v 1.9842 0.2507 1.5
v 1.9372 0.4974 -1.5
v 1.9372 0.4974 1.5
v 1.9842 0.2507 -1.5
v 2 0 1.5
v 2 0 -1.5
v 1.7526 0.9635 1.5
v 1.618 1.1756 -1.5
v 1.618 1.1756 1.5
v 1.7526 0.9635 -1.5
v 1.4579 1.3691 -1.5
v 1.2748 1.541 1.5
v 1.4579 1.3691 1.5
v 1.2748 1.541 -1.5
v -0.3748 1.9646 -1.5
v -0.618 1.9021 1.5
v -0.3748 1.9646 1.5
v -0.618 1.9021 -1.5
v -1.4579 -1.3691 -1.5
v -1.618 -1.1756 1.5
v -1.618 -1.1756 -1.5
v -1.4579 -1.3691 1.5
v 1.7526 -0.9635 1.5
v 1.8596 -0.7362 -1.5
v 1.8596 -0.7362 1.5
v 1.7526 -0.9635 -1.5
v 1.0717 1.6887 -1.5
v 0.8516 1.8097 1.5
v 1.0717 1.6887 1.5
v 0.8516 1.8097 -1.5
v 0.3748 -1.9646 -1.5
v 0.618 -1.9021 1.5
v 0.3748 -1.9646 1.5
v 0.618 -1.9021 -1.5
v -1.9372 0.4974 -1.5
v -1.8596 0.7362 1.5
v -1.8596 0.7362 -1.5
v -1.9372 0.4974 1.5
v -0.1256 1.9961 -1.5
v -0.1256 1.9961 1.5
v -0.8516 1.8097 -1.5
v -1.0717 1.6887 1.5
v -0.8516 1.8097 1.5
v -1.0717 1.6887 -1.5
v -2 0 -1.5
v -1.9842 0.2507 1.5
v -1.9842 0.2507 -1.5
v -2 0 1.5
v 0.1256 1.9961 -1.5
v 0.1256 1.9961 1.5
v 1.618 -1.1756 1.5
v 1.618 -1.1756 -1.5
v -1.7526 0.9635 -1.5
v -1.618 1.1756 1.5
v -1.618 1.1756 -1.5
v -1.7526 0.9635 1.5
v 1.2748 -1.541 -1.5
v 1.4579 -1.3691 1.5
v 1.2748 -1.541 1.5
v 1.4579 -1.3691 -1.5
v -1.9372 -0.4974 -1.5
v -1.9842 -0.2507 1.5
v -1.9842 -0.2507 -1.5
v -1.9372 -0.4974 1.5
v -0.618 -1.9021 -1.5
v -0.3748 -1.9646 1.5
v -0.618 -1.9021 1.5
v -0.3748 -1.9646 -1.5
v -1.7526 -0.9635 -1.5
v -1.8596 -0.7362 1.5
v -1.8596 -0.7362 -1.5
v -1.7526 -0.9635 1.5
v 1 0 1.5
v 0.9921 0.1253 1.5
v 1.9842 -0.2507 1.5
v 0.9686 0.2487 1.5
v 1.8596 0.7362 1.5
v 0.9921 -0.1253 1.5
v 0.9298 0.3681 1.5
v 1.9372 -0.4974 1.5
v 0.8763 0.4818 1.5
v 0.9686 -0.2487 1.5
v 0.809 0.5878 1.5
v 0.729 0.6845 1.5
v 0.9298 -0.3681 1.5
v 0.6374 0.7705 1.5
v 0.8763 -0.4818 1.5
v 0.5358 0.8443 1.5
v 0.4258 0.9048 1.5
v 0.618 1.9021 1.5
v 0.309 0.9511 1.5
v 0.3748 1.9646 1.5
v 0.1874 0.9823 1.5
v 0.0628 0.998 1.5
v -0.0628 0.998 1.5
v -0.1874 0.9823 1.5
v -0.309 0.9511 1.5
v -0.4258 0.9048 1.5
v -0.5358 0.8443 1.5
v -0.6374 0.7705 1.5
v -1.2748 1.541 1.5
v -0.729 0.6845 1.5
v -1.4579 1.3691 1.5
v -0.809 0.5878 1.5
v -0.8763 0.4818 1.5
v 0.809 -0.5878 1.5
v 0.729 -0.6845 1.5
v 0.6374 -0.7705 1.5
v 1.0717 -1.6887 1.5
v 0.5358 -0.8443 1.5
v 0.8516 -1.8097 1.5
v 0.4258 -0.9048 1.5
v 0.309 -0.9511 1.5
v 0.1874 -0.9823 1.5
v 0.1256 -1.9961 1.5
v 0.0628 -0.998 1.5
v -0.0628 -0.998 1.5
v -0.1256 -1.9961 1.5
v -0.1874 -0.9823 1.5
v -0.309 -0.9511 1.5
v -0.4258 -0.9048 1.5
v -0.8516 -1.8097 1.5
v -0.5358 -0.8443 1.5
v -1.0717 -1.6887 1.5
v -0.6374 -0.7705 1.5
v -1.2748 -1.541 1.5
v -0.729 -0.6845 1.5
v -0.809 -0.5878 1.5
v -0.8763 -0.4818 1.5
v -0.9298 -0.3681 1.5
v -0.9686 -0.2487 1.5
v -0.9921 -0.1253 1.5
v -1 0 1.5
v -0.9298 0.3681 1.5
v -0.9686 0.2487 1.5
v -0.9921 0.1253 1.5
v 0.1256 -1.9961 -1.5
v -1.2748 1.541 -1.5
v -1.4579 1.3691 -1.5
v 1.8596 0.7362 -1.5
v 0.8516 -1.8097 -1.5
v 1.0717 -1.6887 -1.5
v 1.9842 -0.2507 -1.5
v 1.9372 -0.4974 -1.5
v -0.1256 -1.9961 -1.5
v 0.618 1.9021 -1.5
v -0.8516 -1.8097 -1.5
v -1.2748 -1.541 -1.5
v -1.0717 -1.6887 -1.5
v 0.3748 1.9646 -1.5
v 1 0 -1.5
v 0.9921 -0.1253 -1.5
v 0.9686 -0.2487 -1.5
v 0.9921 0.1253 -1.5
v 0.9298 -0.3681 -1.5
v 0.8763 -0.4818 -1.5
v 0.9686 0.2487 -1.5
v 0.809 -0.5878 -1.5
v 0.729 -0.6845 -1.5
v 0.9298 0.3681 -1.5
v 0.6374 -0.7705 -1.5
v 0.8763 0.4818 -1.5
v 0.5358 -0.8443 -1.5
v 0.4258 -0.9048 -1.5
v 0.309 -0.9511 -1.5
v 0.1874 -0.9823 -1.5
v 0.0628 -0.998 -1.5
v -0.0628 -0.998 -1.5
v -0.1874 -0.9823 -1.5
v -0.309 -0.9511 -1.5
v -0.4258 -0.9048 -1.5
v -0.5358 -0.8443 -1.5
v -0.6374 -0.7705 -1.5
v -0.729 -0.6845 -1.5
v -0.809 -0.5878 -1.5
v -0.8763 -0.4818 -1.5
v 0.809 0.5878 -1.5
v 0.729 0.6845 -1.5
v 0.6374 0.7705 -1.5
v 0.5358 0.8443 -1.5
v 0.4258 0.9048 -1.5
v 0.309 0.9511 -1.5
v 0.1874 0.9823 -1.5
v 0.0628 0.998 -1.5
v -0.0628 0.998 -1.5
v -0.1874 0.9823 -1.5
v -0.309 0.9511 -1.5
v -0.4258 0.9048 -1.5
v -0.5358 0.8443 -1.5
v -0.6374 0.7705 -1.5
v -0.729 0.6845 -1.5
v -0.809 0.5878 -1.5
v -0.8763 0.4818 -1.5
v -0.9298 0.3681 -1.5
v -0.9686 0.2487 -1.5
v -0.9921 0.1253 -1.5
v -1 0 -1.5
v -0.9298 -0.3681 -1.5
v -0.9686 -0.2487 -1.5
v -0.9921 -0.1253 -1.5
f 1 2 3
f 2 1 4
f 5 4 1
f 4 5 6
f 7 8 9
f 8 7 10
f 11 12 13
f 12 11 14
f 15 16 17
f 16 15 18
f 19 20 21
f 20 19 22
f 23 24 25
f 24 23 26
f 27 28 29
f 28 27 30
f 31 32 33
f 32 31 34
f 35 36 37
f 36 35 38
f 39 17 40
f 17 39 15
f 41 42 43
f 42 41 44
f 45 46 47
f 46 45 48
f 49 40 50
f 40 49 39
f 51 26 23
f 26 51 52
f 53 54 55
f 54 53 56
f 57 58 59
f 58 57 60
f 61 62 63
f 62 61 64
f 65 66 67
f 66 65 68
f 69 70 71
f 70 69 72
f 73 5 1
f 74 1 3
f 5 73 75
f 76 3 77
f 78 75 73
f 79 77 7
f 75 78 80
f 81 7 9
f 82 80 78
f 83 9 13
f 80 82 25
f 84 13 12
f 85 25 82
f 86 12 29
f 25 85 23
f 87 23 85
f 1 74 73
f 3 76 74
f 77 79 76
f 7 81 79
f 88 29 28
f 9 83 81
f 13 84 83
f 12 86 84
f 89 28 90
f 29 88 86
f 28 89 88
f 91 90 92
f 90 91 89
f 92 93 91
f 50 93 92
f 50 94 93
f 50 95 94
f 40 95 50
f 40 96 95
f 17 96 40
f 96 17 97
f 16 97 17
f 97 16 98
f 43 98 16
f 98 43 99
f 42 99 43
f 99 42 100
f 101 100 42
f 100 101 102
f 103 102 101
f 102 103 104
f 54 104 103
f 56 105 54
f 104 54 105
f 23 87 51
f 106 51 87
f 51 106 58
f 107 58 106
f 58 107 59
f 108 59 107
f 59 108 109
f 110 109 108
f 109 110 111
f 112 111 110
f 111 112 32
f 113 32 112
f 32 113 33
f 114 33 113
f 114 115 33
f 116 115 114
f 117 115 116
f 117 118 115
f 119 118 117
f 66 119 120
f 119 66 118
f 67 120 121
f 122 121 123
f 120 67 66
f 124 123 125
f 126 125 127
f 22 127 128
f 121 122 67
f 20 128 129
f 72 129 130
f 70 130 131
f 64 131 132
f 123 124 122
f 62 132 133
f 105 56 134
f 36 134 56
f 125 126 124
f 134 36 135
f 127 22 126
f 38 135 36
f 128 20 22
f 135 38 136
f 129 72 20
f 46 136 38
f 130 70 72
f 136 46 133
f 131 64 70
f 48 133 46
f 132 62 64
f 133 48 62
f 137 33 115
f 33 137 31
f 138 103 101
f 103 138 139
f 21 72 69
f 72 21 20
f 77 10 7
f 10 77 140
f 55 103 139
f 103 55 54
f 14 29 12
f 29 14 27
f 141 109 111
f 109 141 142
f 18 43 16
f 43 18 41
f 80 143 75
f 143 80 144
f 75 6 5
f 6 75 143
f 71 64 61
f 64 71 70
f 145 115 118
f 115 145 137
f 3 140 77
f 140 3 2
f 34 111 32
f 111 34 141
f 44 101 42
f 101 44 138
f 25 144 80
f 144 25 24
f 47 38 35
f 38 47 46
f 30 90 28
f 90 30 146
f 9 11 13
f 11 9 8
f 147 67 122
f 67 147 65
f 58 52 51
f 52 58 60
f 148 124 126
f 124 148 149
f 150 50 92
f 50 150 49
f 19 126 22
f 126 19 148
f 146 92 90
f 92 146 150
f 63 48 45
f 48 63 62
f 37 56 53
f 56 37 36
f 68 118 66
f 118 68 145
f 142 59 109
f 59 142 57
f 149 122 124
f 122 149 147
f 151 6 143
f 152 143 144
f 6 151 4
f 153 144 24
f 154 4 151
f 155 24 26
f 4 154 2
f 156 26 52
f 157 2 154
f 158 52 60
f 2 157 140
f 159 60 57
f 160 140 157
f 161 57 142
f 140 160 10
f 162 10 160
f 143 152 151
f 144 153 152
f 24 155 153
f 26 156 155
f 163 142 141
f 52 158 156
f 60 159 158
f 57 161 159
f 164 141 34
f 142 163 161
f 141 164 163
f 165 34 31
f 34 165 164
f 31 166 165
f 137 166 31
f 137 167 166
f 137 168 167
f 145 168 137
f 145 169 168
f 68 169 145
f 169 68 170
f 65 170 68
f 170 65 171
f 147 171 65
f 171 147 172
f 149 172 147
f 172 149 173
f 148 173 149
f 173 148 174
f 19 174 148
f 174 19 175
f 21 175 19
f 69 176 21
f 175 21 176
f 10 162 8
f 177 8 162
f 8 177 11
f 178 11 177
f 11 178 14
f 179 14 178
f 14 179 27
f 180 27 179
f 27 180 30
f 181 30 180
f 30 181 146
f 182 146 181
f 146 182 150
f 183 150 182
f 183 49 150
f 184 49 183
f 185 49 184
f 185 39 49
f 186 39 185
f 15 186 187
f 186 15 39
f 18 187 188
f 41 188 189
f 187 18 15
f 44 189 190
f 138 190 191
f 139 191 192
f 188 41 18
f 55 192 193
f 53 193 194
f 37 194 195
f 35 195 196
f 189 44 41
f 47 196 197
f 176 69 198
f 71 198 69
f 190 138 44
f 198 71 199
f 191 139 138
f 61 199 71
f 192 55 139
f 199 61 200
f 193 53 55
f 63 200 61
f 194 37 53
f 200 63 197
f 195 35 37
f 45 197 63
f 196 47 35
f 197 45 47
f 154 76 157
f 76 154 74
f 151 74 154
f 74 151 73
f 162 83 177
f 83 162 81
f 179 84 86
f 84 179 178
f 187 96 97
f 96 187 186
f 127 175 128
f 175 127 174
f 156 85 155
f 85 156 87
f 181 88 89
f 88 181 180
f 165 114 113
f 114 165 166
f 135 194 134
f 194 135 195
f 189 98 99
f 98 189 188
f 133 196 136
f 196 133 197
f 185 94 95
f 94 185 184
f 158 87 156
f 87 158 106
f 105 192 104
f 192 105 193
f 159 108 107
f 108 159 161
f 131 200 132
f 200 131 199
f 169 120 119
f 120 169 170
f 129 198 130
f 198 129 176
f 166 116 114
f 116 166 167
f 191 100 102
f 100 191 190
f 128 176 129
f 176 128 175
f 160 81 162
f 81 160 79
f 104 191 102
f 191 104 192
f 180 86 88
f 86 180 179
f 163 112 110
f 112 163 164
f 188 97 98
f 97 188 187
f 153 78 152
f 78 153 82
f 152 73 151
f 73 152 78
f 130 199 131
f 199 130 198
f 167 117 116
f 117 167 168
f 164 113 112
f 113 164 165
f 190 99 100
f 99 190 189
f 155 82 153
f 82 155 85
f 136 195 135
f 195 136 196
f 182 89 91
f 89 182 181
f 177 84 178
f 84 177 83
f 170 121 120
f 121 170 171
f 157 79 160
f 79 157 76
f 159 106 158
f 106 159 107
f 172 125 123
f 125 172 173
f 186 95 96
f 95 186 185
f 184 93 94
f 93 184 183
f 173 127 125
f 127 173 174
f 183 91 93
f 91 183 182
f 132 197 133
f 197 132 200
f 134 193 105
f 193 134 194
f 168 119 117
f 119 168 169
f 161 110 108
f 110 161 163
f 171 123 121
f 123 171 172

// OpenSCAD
$fn = 50;


difference() {
	union() {
		translate(v = [0, 0, -1.5000000000]) {
			cylinder(h = 3, r = 2.0000000000);
		}
	}
	union() {
		translate(v = [0, 0, -100.0000000000]) {
			cylinder(h = 200, r = 1.0000000000);
		}
	}
}
